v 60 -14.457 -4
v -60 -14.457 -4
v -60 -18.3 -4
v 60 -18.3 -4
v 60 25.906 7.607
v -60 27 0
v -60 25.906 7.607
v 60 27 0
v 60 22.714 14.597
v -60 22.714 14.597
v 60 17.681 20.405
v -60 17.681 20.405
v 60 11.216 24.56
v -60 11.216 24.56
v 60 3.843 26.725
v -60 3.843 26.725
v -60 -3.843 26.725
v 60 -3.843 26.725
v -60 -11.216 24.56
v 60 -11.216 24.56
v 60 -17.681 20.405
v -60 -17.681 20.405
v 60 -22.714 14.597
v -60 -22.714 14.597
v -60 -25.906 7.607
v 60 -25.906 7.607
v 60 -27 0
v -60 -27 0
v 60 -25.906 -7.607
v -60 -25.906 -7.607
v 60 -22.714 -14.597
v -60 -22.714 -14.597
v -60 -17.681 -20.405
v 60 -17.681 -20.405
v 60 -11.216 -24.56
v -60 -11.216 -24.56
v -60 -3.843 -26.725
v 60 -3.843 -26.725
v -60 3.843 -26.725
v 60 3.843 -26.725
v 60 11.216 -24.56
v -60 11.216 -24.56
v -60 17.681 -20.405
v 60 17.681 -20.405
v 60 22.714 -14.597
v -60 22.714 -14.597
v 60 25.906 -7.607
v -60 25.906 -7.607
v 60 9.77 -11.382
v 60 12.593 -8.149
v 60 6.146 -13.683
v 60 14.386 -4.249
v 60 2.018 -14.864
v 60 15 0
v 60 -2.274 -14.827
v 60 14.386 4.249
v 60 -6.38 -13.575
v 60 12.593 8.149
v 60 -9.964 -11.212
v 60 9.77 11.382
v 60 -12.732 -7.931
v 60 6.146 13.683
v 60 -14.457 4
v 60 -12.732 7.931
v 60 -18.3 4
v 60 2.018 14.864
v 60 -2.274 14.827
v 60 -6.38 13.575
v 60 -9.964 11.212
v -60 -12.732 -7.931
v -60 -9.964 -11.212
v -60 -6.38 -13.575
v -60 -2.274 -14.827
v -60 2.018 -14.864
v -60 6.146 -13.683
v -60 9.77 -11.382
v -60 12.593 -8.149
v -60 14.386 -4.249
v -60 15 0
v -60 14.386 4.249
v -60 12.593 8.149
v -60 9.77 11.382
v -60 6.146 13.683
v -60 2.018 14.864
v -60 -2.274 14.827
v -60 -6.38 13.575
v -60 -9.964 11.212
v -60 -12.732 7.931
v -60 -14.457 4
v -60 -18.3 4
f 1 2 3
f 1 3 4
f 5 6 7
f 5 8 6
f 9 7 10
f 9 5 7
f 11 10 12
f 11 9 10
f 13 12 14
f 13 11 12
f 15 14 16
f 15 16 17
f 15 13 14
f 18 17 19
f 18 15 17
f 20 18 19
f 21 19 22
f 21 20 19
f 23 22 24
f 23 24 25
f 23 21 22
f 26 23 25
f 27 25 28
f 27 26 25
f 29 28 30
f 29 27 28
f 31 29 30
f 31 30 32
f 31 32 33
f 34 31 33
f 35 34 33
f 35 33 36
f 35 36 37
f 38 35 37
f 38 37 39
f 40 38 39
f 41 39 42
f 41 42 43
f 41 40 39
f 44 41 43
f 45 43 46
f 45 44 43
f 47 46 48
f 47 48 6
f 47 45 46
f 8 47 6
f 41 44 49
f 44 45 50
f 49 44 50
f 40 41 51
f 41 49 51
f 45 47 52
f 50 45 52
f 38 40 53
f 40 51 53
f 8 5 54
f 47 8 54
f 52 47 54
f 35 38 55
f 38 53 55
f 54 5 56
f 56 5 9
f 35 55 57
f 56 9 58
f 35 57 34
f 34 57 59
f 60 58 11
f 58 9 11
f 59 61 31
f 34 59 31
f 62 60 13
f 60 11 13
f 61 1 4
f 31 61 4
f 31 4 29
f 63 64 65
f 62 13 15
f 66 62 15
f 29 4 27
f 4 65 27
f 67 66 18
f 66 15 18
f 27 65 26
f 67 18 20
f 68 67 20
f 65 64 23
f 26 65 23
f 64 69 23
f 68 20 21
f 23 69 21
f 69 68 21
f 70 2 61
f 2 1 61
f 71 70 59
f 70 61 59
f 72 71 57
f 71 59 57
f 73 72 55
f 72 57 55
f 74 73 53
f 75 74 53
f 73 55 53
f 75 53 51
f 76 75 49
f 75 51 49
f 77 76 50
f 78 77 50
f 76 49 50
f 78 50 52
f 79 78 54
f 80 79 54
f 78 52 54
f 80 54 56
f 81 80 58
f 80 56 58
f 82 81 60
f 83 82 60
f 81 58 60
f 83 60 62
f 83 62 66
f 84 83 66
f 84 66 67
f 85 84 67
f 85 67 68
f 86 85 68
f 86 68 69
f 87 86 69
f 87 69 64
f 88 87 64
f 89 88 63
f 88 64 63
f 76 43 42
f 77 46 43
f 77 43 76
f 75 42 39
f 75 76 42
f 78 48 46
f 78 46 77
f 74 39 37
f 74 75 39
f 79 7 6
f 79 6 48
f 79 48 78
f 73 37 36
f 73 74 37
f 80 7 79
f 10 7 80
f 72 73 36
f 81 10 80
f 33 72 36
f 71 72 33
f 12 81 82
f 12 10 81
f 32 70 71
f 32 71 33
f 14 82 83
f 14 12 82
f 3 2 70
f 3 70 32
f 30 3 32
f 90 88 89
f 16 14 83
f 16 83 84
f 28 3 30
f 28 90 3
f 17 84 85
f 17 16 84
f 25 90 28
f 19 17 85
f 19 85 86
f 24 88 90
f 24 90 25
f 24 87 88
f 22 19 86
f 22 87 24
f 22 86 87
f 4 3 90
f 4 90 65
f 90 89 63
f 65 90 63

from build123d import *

# Parameters (mm, degrees)
IZIM1_W               = 120
IZIM1_H               = 12
IZIM2_W               = 120
IZIM2_H               = 8
KES_EKSTR_ZYON1_DEPTH = 18.3


with BuildPart() as part:
    # Çizim1 → Döndür1 (revolve)
    with BuildSketch(Plane.XY):
        with Locations((0, 21)):
            Rectangle(IZIM1_W, IZIM1_H)
    revolve(axis=Axis((-60, 0, 0), (1, 0, 0)))

    # Çizim2 → Kes-Ekstrüzyon1 (cut)
    with BuildSketch(Plane(origin=(0, 0, 0), x_dir=(1, 0, 0), z_dir=(0, 1, 0))):
        Rectangle(IZIM2_W, IZIM2_H)
    extrude(amount=-KES_EKSTR_ZYON1_DEPTH, mode=Mode.SUBTRACT)


solid = part.part
